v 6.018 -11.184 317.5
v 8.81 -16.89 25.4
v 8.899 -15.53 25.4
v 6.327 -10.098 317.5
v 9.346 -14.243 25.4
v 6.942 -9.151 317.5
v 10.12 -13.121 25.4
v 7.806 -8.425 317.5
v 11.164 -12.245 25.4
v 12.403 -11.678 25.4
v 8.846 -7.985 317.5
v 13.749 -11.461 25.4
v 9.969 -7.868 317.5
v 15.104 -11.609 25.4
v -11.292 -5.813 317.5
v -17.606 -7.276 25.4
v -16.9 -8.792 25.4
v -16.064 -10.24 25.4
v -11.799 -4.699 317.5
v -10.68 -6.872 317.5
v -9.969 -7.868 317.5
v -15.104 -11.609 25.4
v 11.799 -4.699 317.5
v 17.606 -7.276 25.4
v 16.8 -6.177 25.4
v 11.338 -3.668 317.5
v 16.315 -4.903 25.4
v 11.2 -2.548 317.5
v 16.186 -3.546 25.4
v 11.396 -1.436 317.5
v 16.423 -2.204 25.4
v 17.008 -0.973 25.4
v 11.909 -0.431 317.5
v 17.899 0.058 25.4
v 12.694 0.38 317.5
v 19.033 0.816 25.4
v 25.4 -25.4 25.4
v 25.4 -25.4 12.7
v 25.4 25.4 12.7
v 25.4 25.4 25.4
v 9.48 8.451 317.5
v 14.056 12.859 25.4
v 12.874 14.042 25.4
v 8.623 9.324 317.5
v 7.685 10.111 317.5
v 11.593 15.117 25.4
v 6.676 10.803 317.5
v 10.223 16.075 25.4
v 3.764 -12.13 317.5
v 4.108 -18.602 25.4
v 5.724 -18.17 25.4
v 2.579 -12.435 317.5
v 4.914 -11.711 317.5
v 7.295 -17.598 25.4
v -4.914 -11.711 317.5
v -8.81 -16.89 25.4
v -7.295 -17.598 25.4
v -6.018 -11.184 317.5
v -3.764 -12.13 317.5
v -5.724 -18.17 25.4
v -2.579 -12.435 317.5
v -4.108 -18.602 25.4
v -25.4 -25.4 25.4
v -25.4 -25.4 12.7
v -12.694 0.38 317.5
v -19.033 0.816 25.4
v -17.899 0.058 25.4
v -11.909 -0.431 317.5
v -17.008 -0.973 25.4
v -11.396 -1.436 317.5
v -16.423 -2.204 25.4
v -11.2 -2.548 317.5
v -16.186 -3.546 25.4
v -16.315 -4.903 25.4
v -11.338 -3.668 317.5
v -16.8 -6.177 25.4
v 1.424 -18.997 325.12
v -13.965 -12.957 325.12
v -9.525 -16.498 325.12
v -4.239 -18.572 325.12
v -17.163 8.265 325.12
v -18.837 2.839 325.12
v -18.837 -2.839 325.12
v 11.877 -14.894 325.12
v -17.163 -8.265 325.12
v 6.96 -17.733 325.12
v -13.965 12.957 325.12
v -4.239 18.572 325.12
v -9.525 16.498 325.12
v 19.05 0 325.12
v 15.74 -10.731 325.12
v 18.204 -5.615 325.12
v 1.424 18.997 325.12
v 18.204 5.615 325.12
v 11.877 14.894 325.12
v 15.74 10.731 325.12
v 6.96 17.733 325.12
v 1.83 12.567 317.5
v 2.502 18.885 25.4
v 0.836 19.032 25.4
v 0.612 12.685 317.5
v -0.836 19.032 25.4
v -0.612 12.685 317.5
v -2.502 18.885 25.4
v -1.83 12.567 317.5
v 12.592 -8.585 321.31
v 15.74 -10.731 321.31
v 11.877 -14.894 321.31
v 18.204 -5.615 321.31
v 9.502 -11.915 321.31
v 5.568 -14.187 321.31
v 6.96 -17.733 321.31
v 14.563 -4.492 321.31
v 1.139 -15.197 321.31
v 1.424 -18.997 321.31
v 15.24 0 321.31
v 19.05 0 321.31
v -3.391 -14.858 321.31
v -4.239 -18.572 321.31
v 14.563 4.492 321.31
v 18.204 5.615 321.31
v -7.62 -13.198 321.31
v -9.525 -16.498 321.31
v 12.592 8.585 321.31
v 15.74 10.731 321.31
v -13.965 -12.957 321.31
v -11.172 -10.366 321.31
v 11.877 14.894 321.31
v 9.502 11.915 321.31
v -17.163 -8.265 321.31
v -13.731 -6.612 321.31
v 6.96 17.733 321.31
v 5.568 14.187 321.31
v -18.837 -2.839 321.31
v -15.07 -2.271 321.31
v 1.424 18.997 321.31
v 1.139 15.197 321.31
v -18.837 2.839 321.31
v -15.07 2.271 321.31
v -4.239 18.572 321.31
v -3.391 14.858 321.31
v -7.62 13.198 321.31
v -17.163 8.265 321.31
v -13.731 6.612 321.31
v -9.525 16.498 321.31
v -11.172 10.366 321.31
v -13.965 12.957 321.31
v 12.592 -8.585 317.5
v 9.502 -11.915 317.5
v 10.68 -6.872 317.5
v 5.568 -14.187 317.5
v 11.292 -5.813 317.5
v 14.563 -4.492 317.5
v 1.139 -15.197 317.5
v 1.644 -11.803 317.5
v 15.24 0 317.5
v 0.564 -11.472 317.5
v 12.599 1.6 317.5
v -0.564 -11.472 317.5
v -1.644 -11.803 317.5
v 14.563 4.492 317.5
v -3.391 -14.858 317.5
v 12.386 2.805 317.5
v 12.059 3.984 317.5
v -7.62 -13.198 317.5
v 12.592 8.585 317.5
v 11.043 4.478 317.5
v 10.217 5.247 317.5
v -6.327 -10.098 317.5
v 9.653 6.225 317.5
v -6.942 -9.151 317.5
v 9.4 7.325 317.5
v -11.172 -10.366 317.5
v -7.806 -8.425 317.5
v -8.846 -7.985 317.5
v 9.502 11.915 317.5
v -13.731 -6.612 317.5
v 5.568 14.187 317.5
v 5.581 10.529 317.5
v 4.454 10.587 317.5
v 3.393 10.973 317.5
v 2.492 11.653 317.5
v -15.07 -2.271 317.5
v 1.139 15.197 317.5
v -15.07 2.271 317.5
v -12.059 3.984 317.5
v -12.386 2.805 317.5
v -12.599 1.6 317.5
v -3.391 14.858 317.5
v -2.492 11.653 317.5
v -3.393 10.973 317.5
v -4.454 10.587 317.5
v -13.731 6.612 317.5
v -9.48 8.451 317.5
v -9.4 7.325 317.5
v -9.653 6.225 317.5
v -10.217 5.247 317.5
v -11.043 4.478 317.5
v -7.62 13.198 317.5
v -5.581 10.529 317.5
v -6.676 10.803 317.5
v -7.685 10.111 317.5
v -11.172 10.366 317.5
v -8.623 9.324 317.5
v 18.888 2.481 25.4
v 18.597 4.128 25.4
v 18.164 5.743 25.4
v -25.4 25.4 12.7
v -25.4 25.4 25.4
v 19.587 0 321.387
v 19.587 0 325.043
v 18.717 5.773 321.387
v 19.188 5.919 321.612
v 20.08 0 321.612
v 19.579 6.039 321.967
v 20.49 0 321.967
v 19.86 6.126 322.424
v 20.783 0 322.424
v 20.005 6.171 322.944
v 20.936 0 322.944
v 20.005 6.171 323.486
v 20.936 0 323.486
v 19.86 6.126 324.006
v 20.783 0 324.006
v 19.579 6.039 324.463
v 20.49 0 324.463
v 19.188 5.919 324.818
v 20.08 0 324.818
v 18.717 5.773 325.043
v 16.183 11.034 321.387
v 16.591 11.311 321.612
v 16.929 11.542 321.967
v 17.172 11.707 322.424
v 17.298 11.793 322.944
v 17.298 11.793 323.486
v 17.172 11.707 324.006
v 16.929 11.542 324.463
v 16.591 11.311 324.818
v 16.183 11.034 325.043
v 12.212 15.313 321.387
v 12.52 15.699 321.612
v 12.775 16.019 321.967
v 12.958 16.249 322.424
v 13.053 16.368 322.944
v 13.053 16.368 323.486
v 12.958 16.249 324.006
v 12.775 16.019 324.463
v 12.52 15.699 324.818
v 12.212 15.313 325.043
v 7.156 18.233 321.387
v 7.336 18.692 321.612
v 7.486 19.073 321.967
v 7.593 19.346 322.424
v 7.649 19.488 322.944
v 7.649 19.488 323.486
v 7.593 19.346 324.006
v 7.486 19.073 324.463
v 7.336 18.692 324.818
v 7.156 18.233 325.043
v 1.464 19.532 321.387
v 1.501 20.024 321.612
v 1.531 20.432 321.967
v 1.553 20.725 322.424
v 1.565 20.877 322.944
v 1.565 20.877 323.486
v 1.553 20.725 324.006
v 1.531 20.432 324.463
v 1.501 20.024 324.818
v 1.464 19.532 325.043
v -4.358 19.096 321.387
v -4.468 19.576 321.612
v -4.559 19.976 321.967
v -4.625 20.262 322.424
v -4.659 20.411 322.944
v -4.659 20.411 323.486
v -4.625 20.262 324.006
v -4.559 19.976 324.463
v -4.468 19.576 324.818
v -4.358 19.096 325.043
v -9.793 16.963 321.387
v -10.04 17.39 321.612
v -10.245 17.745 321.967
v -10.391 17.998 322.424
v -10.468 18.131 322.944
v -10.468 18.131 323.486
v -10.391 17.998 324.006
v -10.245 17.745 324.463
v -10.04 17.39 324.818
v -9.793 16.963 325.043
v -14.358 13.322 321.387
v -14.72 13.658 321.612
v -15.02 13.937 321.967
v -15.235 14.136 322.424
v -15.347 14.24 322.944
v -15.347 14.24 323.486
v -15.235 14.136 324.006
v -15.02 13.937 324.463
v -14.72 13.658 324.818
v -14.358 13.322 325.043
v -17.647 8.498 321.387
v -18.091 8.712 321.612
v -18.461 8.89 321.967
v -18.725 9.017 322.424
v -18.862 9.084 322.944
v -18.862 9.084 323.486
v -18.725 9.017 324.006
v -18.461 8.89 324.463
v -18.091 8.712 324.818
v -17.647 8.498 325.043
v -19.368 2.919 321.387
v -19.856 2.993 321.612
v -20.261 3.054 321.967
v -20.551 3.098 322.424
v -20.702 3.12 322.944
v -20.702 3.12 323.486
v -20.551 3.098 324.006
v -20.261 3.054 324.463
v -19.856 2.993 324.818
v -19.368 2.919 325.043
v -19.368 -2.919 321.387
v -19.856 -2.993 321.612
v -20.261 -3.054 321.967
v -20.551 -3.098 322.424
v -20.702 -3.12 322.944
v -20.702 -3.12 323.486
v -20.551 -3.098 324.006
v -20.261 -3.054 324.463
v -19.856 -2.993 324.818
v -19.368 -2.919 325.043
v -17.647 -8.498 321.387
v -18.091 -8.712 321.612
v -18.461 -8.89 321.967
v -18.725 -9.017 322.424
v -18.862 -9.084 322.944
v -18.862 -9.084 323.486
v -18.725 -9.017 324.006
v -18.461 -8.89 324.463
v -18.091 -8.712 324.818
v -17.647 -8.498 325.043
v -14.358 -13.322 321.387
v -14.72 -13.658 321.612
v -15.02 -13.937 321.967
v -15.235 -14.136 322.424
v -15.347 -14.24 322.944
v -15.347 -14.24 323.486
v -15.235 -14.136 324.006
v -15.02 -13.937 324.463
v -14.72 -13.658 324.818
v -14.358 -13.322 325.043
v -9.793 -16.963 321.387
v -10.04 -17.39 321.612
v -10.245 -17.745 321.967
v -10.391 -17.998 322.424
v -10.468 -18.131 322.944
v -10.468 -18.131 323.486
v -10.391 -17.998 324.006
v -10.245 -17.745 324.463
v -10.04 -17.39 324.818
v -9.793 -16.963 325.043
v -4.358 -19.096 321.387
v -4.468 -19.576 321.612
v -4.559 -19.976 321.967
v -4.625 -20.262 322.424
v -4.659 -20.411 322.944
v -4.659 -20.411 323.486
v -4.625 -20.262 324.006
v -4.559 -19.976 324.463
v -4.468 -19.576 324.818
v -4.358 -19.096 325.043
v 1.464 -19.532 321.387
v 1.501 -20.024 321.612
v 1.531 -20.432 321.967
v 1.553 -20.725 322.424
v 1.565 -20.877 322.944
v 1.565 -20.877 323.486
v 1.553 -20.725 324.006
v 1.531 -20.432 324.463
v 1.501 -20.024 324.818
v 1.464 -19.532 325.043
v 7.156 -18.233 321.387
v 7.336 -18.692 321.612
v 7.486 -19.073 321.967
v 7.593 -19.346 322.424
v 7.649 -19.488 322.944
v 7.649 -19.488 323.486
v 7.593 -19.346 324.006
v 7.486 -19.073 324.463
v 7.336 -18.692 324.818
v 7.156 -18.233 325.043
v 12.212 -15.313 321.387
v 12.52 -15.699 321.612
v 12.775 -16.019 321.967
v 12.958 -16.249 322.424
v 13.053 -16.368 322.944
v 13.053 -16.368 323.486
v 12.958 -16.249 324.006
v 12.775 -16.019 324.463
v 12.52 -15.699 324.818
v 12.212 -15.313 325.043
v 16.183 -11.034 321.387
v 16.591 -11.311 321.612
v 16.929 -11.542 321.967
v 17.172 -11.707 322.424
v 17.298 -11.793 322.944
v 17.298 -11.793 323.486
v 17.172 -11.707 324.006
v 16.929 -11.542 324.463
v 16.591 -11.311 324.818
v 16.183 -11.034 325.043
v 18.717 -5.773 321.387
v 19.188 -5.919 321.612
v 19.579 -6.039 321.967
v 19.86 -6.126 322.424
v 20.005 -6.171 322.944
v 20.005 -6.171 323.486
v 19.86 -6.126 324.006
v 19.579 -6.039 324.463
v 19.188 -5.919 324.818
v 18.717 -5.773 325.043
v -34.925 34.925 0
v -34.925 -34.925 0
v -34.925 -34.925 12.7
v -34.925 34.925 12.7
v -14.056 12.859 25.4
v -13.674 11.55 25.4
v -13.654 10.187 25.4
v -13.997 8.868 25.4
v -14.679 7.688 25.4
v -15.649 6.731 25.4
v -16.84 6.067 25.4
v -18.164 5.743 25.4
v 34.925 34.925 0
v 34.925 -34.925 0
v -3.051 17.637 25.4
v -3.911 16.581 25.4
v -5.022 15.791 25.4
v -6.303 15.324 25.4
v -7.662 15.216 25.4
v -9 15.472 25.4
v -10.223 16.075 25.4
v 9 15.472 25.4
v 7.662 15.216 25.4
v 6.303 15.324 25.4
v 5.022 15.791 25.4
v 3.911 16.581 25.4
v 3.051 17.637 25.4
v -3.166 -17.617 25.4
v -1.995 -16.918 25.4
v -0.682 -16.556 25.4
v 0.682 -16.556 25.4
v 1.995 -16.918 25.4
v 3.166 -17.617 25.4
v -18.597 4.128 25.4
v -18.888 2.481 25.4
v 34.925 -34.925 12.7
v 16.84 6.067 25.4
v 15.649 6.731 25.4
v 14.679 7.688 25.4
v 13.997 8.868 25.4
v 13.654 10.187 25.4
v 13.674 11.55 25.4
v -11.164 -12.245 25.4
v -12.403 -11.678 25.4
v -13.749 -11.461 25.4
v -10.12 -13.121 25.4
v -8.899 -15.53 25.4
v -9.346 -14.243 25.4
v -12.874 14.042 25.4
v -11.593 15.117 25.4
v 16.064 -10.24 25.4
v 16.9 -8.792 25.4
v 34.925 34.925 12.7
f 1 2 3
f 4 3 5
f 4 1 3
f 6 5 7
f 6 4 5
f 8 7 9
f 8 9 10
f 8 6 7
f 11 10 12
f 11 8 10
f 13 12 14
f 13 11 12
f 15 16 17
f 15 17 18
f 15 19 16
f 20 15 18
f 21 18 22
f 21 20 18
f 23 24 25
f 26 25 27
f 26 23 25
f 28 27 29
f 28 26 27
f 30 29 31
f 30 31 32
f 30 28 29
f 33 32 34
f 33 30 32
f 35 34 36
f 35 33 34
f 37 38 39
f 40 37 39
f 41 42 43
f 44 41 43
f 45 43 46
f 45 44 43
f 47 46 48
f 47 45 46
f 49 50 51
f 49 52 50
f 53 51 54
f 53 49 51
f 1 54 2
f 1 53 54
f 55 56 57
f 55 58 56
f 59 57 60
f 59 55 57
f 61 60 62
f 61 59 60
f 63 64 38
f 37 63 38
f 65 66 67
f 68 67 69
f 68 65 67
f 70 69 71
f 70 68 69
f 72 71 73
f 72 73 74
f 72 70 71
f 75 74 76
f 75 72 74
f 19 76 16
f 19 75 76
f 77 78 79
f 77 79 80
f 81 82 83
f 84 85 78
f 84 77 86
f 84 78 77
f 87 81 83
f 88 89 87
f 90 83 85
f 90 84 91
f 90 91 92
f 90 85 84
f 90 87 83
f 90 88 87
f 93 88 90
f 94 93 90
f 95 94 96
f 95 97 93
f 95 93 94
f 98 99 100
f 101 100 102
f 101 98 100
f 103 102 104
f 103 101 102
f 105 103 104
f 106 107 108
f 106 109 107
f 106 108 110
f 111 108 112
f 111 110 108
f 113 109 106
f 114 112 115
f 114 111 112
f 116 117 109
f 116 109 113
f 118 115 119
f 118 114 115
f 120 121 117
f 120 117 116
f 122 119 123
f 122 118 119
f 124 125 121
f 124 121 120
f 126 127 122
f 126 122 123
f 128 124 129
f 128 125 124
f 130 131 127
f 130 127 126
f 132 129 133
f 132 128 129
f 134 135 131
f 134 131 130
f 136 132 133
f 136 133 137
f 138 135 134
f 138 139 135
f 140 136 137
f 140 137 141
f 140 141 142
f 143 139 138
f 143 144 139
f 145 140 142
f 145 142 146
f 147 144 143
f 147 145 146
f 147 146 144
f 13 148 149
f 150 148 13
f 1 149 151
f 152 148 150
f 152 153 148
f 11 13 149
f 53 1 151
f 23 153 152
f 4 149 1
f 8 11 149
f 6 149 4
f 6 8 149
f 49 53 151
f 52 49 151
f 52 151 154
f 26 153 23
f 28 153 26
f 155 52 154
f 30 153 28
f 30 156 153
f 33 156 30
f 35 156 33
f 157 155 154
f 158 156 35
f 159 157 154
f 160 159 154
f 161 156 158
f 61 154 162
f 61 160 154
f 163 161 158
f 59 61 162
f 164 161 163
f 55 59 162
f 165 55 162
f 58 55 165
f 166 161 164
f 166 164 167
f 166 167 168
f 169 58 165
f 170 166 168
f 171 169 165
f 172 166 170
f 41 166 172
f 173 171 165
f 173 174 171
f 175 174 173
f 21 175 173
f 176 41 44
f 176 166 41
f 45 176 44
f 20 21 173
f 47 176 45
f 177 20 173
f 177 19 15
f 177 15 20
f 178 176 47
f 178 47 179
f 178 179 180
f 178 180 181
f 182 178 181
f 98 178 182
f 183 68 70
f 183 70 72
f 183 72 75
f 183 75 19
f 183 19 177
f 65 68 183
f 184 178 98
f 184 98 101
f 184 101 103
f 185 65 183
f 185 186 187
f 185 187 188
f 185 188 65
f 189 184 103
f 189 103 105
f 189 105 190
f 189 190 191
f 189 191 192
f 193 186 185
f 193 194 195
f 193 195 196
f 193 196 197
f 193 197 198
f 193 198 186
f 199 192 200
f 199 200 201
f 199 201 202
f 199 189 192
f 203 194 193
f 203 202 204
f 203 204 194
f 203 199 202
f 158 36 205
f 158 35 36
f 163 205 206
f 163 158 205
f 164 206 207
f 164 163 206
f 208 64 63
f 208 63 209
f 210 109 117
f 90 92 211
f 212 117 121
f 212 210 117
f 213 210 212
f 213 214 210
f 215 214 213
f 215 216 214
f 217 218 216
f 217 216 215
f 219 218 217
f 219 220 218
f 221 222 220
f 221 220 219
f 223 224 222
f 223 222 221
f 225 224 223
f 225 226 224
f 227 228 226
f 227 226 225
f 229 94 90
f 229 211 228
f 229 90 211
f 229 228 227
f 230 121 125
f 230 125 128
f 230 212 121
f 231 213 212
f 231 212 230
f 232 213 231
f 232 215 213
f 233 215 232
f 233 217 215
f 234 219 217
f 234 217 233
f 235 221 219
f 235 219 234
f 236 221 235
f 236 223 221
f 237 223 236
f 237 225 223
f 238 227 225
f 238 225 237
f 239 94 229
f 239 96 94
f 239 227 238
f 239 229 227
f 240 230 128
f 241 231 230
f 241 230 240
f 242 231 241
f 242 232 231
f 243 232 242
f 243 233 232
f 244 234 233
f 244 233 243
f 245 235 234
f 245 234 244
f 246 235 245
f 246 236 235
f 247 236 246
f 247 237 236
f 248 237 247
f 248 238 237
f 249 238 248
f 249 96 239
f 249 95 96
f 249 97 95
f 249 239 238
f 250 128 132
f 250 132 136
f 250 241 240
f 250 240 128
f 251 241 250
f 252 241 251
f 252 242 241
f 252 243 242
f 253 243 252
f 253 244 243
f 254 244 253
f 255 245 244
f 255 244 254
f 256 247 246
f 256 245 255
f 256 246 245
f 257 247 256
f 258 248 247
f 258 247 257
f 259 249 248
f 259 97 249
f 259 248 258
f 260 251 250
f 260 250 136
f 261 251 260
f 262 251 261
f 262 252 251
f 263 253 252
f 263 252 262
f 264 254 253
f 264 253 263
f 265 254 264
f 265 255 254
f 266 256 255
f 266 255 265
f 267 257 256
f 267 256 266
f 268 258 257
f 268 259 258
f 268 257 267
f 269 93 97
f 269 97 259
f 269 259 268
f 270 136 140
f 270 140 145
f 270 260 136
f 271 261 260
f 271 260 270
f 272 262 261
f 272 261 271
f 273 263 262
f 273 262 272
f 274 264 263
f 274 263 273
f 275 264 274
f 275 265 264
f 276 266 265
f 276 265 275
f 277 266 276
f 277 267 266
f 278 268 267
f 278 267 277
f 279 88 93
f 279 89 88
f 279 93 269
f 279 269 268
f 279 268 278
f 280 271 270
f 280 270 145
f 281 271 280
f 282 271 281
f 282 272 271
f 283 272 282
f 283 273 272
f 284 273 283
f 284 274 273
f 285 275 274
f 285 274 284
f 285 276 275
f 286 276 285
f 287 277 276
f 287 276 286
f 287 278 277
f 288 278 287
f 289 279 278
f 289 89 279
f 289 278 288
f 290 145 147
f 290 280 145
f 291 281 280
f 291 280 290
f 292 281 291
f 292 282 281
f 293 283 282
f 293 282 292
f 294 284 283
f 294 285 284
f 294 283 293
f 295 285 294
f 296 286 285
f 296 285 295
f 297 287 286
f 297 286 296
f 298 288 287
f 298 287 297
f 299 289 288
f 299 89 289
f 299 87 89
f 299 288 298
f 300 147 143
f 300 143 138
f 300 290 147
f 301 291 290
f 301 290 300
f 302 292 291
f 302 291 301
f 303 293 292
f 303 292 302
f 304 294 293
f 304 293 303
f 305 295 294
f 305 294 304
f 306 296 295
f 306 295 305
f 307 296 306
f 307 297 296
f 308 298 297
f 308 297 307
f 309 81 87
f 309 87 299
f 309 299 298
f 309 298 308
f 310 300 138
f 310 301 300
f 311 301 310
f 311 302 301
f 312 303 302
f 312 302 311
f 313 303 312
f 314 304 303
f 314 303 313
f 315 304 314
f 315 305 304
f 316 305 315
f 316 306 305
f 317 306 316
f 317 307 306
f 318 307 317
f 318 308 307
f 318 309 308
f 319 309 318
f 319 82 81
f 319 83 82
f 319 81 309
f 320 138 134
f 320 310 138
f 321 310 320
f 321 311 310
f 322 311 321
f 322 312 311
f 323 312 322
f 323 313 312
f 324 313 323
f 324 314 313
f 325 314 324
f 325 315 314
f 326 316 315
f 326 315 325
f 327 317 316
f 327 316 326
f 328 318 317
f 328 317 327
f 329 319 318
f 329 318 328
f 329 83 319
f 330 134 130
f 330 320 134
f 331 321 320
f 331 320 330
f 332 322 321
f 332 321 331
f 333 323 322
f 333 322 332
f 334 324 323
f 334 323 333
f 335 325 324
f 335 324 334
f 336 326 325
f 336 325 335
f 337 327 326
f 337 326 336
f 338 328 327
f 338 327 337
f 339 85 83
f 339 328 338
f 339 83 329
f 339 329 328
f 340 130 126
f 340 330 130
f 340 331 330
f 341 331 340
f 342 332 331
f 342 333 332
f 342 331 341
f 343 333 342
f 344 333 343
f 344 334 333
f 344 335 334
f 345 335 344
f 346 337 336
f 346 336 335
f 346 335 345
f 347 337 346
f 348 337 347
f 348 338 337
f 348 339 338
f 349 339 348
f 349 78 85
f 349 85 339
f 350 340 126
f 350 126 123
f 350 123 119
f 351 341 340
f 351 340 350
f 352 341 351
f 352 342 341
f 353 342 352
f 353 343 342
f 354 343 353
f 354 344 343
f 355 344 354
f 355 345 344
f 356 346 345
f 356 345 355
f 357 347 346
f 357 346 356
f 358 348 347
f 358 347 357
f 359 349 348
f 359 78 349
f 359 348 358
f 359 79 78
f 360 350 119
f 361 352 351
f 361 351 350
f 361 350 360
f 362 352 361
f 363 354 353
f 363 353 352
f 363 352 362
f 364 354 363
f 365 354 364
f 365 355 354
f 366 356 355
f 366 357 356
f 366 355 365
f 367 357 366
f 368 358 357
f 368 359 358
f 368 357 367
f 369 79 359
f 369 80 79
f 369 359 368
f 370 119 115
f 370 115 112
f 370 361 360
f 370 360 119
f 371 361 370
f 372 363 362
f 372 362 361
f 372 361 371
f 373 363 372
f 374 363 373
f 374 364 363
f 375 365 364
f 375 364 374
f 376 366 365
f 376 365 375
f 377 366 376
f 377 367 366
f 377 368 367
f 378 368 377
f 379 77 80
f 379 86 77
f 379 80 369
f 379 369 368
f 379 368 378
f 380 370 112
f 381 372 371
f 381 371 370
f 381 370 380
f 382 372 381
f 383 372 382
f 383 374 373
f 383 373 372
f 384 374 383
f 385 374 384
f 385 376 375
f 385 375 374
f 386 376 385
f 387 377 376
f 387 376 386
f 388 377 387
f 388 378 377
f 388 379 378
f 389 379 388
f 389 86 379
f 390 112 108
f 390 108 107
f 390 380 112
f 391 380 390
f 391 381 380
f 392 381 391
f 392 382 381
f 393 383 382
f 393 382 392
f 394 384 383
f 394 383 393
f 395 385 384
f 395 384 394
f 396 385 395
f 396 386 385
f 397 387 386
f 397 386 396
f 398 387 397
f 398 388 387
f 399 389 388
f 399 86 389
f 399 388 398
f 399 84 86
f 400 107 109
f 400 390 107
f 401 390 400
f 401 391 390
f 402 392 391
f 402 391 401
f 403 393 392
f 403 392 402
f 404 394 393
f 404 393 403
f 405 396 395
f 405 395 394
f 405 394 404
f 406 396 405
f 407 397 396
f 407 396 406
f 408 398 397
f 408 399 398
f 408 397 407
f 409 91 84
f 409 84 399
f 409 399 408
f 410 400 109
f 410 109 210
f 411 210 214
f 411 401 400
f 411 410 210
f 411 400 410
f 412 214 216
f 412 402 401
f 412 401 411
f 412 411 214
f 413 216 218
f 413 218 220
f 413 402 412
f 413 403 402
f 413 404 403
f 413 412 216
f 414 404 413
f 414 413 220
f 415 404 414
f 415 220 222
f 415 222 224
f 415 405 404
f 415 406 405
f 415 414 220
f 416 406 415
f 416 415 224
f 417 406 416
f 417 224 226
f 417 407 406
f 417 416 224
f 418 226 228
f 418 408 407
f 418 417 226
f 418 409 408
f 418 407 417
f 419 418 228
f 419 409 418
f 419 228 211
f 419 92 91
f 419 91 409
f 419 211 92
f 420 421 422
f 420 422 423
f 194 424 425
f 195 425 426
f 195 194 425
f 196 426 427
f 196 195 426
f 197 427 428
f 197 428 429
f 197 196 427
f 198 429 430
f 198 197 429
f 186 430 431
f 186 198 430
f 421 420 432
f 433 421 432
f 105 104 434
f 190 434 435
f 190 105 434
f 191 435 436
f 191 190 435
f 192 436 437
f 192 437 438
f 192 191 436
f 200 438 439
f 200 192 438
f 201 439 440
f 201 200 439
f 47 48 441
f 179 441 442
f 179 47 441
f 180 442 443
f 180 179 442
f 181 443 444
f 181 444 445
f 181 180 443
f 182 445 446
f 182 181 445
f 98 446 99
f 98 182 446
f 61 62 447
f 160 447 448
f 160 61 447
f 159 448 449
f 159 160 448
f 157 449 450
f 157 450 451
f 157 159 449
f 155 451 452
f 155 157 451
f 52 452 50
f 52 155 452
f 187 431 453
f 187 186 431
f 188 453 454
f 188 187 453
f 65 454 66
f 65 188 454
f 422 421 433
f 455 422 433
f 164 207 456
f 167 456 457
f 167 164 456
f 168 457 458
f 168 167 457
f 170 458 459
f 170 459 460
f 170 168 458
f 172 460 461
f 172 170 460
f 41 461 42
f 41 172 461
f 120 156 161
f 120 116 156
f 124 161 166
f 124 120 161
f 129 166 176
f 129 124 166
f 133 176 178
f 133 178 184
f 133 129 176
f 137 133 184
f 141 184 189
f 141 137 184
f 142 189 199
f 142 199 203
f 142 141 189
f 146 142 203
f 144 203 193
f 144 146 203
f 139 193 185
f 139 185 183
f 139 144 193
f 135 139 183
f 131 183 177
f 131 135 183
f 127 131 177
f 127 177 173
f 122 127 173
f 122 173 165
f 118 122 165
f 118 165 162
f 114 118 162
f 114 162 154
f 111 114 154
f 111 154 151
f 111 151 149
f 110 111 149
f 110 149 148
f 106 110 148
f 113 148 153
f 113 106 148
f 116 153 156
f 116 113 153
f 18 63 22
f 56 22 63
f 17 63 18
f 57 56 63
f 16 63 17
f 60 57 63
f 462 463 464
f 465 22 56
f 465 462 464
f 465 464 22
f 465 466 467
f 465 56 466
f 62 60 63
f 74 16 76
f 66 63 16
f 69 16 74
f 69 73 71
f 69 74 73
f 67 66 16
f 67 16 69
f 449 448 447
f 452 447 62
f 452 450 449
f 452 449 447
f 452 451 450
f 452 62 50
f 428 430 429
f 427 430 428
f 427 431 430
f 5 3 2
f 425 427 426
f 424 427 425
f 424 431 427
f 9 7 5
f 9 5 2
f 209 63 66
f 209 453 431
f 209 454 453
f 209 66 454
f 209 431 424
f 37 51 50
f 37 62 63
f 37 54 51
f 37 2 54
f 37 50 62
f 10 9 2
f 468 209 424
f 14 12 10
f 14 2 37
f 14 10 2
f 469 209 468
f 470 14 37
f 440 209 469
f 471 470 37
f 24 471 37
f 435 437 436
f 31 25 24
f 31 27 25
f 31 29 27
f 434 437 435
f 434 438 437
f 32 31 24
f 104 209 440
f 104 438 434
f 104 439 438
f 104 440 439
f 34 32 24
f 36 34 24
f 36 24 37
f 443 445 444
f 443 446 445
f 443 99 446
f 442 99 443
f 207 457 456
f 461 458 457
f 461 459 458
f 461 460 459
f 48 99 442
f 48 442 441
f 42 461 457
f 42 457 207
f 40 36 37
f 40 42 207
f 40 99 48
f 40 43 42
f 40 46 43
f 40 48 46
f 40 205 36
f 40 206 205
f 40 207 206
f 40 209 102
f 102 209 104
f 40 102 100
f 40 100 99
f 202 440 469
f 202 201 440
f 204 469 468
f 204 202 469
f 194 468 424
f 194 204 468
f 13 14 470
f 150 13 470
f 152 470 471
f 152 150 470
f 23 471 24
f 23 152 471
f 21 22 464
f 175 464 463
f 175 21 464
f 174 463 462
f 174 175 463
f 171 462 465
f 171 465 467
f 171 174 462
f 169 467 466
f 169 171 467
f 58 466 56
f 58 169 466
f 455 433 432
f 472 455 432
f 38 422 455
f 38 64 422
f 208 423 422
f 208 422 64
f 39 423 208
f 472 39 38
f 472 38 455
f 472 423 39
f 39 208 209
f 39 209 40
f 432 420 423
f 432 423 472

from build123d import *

# Parameters (mm, degrees)
F0_W     = 69.85
F0_H     = 69.85
F1_DEPTH = 12.7
F2_W     = 50.8
F2_H     = 50.8
F3_DEPTH = 12.7


with BuildPart() as f1:
    # F0 (on Top) → F1 (new body)
    with BuildSketch(Plane.XY):
        Rectangle(F0_W, F0_H)
    extrude(amount=F1_DEPTH)

    # F2 (on face) → F3 (join)
    with BuildSketch(Plane.XY.offset(12.7)):
        Rectangle(F2_W, F2_H)
    extrude(amount=F3_DEPTH)

    # F4 (on face) → F7 section 0
    with BuildSketch(Plane.XY.offset(25.4)):
        with BuildLine():
            ThreePointArc((17.60579, -7.275895), (16.259176, -2.866931), (19.032534, 0.81557))
            ThreePointArc((19.032534, 0.81557), (18.760588, 3.307998), (18.163673, 5.743125))
            ThreePointArc((18.163673, 5.743125), (14.298079, 8.255), (14.055529, 12.85864))
            ThreePointArc((14.055529, 12.85864), (12.245104, 14.593147), (10.222571, 16.074873))
            ThreePointArc((10.222571, 16.074873), (5.646753, 15.514325), (2.501785, 18.885009))
            ThreePointArc((2.501785, 18.885009), (0, 19.05), (-2.501785, 18.885009))
            ThreePointArc((-2.501785, 18.885009), (-5.646753, 15.514325), (-10.222571, 16.074873))
            ThreePointArc((-10.222571, 16.074873), (-12.245104, 14.593147), (-14.055529, 12.85864))
            ThreePointArc((-14.055529, 12.85864), (-14.298079, 8.255), (-18.163673, 5.743125))
            ThreePointArc((-18.163673, 5.743125), (-18.760588, 3.307998), (-19.032534, 0.81557))
            ThreePointArc((-19.032534, 0.81557), (-16.259176, -2.866931), (-17.60579, -7.275895))
            ThreePointArc((-17.60579, -7.275895), (-16.497784, -9.525), (-15.104005, -11.609114))
            ThreePointArc((-15.104005, -11.609114), (-10.612423, -12.647394), (-8.809963, -16.890443))
            ThreePointArc((-8.809963, -16.890443), (-6.515484, -17.901144), (-4.108144, -18.601765))
            ThreePointArc((-4.108144, -18.601765), (0, -16.51), (4.108144, -18.601765))
            ThreePointArc((4.108144, -18.601765), (6.515484, -17.901144), (8.809963, -16.890443))
            ThreePointArc((8.809963, -16.890443), (10.612423, -12.647394), (15.104005, -11.609114))
            ThreePointArc((15.104005, -11.609114), (16.497784, -9.525), (17.60579, -7.275895))
        make_face()
    # F6 (on offset) → F7 section 1
    with BuildSketch(Plane.XY.offset(317.5)):
        with BuildLine():
            ThreePointArc((11.798684, -4.699048), (11.256353, -1.984799), (12.694305, 0.380274))
            ThreePointArc((12.694305, 0.380274), (12.507058, 2.205332), (12.058806, 3.984368))
            ThreePointArc((12.058806, 3.984368), (9.89867, 5.715), (9.479967, 8.451049))
            ThreePointArc((9.479967, 8.451049), (8.163403, 9.728764), (6.676479, 10.803454))
            ThreePointArc((6.676479, 10.803454), (3.90929, 10.740687), (1.829847, 12.567484))
            ThreePointArc((1.829847, 12.567484), (0, 12.7), (-1.829847, 12.567484))
            ThreePointArc((-1.829847, 12.567484), (-3.90929, 10.740687), (-6.676479, 10.803454))
            ThreePointArc((-6.676479, 10.803454), (-8.163403, 9.728764), (-9.479967, 8.451049))
            ThreePointArc((-9.479967, 8.451049), (-9.89867, 5.715), (-12.058806, 3.984368))
            ThreePointArc((-12.058806, 3.984368), (-12.507058, 2.205332), (-12.694305, 0.380274))
            ThreePointArc((-12.694305, 0.380274), (-11.256353, -1.984799), (-11.798684, -4.699048))
            ThreePointArc((-11.798684, -4.699048), (-10.998523, -6.35), (-9.968837, -7.868436))
            ThreePointArc((-9.968837, -7.868436), (-7.347062, -8.755888), (-6.017826, -11.183728))
            ThreePointArc((-6.017826, -11.183728), (-4.343656, -11.934096), (-2.578839, -12.435417))
            ThreePointArc((-2.578839, -12.435417), (0, -11.43), (2.578839, -12.435417))
            ThreePointArc((2.578839, -12.435417), (4.343656, -11.934096), (6.017826, -11.183728))
            ThreePointArc((6.017826, -11.183728), (7.347062, -8.755888), (9.968837, -7.868436))
            ThreePointArc((9.968837, -7.868436), (10.998523, -6.35), (11.798684, -4.699048))
        make_face()
    loft()

    # F8 (on Front) → F9 (revolve)
    with BuildSketch(Plane.XZ):
        Polygon((0, 325.12), (0, 317.5), (15.24, 317.5), (15.24, 321.31), (19.05, 321.31), (19.05, 325.12), align=None)
        with BuildLine():
            ThreePointArc((19.05, 321.31), (20.955, 323.215), (19.05, 325.12))
            Line((19.05, 325.12), (19.05, 321.31))
        make_face()
    revolve(axis=Axis((0, 0, 321.31), (0, 0, 1)))


solid = f1.part
